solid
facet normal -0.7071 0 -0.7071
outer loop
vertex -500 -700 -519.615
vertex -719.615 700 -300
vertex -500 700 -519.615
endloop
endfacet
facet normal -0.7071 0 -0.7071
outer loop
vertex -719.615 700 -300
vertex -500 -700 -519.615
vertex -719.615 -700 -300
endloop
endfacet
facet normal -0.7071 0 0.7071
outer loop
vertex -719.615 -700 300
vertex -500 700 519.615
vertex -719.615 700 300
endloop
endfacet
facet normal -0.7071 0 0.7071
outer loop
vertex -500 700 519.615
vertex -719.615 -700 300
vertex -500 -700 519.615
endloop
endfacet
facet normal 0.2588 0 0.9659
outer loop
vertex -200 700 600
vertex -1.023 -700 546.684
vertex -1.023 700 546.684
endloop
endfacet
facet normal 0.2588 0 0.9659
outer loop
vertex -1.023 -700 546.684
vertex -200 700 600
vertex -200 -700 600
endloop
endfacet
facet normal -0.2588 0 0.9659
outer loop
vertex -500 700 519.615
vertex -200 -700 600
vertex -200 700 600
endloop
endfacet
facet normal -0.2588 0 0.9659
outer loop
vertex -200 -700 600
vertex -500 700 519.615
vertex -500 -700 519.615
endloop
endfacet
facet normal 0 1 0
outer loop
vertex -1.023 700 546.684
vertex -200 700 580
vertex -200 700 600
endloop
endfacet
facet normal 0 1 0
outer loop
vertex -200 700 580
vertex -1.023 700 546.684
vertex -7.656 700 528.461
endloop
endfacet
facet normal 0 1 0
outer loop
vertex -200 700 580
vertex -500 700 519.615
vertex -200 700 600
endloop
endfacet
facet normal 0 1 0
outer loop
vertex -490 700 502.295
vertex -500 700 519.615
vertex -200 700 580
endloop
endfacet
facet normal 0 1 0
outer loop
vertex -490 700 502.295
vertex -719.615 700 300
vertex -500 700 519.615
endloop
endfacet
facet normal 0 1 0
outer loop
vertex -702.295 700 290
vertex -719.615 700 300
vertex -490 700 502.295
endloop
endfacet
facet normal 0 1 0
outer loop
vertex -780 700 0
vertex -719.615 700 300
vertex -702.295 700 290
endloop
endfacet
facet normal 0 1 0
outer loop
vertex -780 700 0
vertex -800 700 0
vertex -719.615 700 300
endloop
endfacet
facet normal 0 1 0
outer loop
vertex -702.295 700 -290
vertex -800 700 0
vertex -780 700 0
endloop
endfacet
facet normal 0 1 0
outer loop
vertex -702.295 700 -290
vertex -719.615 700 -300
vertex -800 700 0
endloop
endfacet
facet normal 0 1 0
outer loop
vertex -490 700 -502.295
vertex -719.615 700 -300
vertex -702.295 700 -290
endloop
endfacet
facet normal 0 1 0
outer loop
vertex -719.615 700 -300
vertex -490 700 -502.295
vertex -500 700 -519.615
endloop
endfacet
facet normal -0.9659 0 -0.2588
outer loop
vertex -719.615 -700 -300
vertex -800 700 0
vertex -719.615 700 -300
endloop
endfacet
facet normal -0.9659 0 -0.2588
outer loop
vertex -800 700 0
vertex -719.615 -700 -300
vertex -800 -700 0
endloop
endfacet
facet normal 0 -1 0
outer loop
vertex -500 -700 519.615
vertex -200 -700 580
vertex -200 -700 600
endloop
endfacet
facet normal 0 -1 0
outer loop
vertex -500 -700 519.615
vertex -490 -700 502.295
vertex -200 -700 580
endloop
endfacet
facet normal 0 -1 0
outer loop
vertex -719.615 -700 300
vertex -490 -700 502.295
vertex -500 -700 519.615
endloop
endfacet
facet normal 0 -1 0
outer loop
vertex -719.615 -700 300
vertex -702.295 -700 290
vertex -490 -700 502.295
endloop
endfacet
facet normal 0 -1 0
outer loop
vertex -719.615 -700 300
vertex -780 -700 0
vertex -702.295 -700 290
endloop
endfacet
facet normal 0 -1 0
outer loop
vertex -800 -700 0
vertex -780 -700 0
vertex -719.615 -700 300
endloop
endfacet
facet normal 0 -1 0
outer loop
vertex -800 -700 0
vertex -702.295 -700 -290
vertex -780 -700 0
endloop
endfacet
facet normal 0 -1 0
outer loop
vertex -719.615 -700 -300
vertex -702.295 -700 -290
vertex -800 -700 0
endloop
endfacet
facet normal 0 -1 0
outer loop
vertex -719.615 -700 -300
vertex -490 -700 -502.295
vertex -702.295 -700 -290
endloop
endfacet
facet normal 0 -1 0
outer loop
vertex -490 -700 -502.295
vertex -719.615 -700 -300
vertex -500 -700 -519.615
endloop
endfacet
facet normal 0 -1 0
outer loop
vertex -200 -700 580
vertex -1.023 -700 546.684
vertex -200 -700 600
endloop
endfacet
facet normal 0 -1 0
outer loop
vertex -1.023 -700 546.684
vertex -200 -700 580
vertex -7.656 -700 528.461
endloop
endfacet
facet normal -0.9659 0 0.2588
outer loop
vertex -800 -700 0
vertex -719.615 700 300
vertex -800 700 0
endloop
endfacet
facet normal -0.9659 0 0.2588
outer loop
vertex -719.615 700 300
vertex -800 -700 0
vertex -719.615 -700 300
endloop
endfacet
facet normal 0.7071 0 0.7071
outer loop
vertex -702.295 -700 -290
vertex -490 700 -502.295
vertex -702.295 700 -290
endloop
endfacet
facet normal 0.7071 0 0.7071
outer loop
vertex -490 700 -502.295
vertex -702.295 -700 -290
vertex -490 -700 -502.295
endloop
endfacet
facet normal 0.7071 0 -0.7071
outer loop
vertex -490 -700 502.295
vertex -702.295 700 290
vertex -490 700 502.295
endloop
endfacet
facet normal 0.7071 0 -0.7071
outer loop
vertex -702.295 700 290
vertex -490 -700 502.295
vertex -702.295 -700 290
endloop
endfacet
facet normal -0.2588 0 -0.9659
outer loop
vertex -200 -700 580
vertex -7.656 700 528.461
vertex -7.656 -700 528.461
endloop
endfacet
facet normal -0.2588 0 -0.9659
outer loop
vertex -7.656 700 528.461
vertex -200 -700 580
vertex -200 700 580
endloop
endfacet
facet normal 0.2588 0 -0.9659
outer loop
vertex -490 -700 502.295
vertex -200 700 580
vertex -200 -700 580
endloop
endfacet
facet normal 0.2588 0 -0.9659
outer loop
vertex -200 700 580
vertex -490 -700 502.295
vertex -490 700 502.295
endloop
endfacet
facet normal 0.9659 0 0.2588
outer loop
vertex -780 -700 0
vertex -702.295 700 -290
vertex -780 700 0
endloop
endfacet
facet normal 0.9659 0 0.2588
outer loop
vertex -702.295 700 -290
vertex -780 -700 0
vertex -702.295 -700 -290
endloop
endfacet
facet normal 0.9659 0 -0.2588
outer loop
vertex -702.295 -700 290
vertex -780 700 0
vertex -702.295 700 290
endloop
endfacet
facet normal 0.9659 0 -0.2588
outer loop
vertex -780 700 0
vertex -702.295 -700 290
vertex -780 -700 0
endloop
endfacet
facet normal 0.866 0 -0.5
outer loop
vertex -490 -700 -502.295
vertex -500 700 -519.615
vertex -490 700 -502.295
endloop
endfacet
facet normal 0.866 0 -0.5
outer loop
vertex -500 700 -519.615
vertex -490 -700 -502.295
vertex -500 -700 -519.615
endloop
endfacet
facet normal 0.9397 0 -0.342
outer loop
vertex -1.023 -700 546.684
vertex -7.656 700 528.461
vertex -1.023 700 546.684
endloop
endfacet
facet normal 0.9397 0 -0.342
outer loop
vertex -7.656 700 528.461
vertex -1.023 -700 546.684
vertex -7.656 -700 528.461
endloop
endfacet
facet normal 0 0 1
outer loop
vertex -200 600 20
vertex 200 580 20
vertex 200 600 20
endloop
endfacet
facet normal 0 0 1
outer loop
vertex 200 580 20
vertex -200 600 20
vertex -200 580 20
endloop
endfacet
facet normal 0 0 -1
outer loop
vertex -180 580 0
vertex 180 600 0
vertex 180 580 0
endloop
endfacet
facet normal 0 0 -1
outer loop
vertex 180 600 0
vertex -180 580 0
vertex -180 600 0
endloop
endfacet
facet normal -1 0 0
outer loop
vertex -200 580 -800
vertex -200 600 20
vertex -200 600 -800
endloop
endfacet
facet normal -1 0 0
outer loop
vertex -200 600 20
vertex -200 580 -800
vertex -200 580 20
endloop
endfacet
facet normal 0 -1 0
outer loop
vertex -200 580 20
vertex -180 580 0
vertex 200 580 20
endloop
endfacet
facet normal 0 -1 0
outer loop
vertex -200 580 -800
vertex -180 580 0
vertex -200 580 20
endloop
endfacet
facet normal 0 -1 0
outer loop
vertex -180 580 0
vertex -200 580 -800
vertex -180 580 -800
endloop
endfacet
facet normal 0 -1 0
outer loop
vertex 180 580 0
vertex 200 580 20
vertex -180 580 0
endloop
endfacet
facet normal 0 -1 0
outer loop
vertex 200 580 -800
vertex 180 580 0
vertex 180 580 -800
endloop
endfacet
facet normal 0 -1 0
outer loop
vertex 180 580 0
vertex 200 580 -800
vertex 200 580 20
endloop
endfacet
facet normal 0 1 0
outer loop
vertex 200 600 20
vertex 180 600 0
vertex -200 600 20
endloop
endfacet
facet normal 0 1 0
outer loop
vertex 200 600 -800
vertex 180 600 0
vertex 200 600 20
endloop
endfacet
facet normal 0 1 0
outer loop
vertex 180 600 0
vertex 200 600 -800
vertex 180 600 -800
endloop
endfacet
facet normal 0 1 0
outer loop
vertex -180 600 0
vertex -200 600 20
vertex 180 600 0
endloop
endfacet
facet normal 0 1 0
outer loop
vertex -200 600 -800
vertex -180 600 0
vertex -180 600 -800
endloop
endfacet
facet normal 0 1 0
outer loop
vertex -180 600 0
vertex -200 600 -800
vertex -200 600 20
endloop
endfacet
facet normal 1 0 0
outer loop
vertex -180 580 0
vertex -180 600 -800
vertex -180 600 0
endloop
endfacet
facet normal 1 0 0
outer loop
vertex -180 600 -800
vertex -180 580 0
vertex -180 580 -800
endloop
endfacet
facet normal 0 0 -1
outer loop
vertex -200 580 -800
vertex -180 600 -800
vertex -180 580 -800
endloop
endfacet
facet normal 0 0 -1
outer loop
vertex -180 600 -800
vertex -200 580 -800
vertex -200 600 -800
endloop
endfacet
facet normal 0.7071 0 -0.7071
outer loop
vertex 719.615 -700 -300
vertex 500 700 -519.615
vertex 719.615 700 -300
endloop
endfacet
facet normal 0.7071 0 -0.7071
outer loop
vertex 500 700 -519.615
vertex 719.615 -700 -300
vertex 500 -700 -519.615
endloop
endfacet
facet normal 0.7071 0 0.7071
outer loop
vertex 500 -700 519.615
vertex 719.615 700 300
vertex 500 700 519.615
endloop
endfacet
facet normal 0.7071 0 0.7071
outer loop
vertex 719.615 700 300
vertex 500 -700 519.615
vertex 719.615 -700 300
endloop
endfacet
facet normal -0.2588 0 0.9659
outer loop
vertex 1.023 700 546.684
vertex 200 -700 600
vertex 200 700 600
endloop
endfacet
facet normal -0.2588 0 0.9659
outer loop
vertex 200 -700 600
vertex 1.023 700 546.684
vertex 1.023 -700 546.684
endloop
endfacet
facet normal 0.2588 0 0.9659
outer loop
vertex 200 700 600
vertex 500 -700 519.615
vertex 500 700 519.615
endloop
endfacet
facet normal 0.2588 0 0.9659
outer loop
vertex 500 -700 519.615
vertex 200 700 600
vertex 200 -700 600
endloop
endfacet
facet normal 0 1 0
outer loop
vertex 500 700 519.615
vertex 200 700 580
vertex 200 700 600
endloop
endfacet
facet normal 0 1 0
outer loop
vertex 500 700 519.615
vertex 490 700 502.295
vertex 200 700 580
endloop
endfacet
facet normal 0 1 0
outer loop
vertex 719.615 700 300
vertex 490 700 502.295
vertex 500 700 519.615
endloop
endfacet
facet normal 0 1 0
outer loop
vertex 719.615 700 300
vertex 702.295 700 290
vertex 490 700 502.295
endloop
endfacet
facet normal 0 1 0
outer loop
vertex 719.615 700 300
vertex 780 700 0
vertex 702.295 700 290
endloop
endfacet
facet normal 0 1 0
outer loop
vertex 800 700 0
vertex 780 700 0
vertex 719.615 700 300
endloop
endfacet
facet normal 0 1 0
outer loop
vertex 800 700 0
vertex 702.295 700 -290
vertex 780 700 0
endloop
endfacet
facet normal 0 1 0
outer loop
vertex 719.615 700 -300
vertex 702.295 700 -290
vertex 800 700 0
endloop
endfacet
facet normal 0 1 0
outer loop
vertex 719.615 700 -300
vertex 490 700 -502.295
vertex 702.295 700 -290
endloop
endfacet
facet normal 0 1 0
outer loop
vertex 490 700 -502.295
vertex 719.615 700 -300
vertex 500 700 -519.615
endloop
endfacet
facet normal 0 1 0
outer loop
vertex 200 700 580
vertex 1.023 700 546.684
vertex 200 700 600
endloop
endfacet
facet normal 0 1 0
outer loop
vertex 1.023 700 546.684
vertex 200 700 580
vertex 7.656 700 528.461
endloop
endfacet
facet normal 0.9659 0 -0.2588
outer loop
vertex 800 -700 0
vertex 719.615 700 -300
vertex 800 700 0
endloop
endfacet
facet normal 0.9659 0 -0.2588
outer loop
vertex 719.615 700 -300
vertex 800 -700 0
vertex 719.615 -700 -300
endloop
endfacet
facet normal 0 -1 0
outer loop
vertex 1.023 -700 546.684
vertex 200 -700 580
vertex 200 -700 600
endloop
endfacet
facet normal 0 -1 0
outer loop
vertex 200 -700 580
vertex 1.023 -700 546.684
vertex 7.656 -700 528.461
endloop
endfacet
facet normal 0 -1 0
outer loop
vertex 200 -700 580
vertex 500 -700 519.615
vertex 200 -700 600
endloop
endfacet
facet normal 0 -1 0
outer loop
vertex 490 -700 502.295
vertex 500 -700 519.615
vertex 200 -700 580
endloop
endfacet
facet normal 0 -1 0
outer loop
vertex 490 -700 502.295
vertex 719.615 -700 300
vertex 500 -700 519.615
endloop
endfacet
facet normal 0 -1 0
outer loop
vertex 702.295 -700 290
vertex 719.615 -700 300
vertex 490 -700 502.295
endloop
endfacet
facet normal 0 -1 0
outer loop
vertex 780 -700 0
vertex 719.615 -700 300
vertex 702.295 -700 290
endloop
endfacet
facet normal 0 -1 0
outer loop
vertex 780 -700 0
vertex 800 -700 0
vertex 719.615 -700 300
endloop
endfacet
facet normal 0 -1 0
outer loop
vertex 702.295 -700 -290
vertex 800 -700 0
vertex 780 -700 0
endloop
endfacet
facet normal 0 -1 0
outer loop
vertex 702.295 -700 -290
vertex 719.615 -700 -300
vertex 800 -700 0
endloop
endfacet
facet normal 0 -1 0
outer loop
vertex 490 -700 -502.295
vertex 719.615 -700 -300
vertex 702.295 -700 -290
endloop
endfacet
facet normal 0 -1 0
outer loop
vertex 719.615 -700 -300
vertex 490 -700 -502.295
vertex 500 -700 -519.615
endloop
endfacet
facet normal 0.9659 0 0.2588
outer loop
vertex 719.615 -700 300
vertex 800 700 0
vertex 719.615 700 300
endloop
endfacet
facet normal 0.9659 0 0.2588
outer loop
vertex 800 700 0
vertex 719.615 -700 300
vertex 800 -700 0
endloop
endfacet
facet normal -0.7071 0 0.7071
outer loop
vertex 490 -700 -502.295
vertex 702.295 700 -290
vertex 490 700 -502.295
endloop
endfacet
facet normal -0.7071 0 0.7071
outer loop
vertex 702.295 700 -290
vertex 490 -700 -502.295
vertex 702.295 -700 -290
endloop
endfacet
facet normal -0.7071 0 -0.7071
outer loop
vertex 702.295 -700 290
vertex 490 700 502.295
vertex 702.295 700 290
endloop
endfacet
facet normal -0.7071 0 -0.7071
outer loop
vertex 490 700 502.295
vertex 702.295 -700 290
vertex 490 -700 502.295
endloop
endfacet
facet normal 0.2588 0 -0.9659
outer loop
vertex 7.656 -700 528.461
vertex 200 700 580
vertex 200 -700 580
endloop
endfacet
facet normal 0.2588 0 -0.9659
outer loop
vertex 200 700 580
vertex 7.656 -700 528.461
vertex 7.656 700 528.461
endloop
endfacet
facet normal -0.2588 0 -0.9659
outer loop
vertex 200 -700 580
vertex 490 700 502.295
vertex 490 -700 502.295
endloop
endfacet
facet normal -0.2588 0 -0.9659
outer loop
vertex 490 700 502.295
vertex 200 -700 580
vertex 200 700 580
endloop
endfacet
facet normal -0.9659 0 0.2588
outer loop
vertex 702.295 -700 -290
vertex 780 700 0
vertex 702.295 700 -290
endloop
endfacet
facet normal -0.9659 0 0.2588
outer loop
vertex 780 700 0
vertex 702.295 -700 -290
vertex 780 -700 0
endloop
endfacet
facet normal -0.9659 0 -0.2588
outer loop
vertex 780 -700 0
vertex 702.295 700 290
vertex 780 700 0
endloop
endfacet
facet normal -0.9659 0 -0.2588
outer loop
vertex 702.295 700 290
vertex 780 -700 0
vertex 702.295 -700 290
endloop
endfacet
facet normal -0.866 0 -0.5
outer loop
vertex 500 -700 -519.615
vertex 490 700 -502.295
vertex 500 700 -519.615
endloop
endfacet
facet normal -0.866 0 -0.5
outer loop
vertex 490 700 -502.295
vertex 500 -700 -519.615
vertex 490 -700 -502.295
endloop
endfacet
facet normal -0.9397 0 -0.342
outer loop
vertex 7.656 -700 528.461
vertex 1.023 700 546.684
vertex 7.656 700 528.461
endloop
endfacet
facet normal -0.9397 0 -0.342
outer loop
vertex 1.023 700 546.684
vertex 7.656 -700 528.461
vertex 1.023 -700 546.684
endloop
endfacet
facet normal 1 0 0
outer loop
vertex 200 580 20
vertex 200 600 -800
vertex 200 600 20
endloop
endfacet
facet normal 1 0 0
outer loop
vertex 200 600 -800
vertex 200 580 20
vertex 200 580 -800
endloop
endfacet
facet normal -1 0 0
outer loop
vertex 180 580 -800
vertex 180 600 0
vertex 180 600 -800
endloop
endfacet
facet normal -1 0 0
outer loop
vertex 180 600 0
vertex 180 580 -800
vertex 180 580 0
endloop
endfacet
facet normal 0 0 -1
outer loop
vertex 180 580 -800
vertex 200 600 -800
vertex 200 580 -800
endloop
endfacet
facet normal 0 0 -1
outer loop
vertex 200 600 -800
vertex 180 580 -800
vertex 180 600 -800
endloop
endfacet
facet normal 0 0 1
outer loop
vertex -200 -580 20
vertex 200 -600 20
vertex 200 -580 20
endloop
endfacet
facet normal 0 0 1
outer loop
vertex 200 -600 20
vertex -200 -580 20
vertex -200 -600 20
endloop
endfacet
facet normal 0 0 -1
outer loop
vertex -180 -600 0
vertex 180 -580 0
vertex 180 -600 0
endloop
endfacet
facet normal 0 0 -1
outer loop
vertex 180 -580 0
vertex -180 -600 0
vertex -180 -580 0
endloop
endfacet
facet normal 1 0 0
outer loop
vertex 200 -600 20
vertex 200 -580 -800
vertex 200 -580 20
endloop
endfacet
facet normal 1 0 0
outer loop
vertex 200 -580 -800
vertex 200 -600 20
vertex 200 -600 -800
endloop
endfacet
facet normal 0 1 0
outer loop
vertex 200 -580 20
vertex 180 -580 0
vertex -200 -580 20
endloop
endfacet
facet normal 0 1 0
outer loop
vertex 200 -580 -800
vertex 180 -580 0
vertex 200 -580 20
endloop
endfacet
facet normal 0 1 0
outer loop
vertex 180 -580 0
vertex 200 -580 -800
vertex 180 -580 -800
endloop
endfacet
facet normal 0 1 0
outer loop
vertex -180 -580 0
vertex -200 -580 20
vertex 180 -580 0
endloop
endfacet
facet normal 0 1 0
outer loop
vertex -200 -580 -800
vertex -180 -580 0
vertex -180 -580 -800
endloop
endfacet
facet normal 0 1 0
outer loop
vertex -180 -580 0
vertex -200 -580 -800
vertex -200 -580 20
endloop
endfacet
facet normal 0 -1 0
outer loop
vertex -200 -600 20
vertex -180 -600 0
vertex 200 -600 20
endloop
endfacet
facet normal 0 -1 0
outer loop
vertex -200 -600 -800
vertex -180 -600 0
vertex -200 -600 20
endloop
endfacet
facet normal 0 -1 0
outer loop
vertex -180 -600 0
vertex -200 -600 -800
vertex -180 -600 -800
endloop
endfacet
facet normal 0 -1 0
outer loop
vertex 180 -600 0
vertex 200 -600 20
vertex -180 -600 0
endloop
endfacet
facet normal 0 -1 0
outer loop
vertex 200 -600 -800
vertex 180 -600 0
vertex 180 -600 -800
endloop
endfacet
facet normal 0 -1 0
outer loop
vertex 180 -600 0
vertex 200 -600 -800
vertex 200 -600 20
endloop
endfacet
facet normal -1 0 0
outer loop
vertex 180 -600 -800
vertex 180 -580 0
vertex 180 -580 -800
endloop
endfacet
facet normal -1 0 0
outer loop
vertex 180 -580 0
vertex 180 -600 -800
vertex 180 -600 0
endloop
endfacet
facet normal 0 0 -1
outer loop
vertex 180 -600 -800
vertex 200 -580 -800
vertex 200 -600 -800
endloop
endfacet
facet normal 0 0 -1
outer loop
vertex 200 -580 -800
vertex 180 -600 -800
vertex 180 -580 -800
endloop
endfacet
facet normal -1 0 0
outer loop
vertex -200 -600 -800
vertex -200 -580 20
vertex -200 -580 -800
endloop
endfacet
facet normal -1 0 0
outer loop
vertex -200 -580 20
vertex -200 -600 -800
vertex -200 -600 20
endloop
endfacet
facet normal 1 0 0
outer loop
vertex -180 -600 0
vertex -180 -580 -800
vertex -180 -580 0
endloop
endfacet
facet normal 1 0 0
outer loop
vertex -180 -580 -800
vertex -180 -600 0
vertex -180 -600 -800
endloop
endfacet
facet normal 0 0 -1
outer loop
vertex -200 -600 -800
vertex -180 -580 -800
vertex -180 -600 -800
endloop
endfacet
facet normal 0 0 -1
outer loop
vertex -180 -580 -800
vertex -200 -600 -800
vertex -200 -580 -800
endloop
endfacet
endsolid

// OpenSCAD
dual_cover("Yes");

//罩子

module dual_telescopes_cover(cover_diameter,cover_length,dual_telescopes_cover){
rotate([-90,-60,0])
difference(){
    $fn=12;
cylinder(h=cover_length,d=cover_diameter,center=true);
cylinder(h=cover_length*2,d=cover_diameter-40,center=true);
translate([0,cover_diameter/2,0])
cube([cover_diameter*2,cover_diameter,cover_length*2],center=true);

rotate([0,0,80])
translate([cover_diameter,0,0])
cube([cover_diameter*2,cover_diameter,cover_length*2],center=true);
}

}

module dual_cover(dual_telescopes_cover){

//罩子拼接下面的立柱
if (dual_telescopes_cover=="Yes")
{
    translate([-200,0,0])
dual_telescopes_cover(1200,1400);

translate([-200,-600,0])
cube([200,20,20]);
translate([-200,-600,-800])
cube([20,20,800]);

mirror([0,1,0])
{
    translate([-200,-600,0])
cube([200,20,20]);
translate([-200,-600,-800])
cube([20,20,800]);
    }
    
mirror([1,0,0])
    {
        translate([-200,0,0])
dual_telescopes_cover(1200,1400);

translate([-200,-600,0])
cube([200,20,20]);
translate([-200,-600,-800])
cube([20,20,800]);

mirror([0,1,0])
{
    translate([-200,-600,0])
cube([200,20,20]);
translate([-200,-600,-800])
cube([20,20,800]);
    }
        }
    }
}
